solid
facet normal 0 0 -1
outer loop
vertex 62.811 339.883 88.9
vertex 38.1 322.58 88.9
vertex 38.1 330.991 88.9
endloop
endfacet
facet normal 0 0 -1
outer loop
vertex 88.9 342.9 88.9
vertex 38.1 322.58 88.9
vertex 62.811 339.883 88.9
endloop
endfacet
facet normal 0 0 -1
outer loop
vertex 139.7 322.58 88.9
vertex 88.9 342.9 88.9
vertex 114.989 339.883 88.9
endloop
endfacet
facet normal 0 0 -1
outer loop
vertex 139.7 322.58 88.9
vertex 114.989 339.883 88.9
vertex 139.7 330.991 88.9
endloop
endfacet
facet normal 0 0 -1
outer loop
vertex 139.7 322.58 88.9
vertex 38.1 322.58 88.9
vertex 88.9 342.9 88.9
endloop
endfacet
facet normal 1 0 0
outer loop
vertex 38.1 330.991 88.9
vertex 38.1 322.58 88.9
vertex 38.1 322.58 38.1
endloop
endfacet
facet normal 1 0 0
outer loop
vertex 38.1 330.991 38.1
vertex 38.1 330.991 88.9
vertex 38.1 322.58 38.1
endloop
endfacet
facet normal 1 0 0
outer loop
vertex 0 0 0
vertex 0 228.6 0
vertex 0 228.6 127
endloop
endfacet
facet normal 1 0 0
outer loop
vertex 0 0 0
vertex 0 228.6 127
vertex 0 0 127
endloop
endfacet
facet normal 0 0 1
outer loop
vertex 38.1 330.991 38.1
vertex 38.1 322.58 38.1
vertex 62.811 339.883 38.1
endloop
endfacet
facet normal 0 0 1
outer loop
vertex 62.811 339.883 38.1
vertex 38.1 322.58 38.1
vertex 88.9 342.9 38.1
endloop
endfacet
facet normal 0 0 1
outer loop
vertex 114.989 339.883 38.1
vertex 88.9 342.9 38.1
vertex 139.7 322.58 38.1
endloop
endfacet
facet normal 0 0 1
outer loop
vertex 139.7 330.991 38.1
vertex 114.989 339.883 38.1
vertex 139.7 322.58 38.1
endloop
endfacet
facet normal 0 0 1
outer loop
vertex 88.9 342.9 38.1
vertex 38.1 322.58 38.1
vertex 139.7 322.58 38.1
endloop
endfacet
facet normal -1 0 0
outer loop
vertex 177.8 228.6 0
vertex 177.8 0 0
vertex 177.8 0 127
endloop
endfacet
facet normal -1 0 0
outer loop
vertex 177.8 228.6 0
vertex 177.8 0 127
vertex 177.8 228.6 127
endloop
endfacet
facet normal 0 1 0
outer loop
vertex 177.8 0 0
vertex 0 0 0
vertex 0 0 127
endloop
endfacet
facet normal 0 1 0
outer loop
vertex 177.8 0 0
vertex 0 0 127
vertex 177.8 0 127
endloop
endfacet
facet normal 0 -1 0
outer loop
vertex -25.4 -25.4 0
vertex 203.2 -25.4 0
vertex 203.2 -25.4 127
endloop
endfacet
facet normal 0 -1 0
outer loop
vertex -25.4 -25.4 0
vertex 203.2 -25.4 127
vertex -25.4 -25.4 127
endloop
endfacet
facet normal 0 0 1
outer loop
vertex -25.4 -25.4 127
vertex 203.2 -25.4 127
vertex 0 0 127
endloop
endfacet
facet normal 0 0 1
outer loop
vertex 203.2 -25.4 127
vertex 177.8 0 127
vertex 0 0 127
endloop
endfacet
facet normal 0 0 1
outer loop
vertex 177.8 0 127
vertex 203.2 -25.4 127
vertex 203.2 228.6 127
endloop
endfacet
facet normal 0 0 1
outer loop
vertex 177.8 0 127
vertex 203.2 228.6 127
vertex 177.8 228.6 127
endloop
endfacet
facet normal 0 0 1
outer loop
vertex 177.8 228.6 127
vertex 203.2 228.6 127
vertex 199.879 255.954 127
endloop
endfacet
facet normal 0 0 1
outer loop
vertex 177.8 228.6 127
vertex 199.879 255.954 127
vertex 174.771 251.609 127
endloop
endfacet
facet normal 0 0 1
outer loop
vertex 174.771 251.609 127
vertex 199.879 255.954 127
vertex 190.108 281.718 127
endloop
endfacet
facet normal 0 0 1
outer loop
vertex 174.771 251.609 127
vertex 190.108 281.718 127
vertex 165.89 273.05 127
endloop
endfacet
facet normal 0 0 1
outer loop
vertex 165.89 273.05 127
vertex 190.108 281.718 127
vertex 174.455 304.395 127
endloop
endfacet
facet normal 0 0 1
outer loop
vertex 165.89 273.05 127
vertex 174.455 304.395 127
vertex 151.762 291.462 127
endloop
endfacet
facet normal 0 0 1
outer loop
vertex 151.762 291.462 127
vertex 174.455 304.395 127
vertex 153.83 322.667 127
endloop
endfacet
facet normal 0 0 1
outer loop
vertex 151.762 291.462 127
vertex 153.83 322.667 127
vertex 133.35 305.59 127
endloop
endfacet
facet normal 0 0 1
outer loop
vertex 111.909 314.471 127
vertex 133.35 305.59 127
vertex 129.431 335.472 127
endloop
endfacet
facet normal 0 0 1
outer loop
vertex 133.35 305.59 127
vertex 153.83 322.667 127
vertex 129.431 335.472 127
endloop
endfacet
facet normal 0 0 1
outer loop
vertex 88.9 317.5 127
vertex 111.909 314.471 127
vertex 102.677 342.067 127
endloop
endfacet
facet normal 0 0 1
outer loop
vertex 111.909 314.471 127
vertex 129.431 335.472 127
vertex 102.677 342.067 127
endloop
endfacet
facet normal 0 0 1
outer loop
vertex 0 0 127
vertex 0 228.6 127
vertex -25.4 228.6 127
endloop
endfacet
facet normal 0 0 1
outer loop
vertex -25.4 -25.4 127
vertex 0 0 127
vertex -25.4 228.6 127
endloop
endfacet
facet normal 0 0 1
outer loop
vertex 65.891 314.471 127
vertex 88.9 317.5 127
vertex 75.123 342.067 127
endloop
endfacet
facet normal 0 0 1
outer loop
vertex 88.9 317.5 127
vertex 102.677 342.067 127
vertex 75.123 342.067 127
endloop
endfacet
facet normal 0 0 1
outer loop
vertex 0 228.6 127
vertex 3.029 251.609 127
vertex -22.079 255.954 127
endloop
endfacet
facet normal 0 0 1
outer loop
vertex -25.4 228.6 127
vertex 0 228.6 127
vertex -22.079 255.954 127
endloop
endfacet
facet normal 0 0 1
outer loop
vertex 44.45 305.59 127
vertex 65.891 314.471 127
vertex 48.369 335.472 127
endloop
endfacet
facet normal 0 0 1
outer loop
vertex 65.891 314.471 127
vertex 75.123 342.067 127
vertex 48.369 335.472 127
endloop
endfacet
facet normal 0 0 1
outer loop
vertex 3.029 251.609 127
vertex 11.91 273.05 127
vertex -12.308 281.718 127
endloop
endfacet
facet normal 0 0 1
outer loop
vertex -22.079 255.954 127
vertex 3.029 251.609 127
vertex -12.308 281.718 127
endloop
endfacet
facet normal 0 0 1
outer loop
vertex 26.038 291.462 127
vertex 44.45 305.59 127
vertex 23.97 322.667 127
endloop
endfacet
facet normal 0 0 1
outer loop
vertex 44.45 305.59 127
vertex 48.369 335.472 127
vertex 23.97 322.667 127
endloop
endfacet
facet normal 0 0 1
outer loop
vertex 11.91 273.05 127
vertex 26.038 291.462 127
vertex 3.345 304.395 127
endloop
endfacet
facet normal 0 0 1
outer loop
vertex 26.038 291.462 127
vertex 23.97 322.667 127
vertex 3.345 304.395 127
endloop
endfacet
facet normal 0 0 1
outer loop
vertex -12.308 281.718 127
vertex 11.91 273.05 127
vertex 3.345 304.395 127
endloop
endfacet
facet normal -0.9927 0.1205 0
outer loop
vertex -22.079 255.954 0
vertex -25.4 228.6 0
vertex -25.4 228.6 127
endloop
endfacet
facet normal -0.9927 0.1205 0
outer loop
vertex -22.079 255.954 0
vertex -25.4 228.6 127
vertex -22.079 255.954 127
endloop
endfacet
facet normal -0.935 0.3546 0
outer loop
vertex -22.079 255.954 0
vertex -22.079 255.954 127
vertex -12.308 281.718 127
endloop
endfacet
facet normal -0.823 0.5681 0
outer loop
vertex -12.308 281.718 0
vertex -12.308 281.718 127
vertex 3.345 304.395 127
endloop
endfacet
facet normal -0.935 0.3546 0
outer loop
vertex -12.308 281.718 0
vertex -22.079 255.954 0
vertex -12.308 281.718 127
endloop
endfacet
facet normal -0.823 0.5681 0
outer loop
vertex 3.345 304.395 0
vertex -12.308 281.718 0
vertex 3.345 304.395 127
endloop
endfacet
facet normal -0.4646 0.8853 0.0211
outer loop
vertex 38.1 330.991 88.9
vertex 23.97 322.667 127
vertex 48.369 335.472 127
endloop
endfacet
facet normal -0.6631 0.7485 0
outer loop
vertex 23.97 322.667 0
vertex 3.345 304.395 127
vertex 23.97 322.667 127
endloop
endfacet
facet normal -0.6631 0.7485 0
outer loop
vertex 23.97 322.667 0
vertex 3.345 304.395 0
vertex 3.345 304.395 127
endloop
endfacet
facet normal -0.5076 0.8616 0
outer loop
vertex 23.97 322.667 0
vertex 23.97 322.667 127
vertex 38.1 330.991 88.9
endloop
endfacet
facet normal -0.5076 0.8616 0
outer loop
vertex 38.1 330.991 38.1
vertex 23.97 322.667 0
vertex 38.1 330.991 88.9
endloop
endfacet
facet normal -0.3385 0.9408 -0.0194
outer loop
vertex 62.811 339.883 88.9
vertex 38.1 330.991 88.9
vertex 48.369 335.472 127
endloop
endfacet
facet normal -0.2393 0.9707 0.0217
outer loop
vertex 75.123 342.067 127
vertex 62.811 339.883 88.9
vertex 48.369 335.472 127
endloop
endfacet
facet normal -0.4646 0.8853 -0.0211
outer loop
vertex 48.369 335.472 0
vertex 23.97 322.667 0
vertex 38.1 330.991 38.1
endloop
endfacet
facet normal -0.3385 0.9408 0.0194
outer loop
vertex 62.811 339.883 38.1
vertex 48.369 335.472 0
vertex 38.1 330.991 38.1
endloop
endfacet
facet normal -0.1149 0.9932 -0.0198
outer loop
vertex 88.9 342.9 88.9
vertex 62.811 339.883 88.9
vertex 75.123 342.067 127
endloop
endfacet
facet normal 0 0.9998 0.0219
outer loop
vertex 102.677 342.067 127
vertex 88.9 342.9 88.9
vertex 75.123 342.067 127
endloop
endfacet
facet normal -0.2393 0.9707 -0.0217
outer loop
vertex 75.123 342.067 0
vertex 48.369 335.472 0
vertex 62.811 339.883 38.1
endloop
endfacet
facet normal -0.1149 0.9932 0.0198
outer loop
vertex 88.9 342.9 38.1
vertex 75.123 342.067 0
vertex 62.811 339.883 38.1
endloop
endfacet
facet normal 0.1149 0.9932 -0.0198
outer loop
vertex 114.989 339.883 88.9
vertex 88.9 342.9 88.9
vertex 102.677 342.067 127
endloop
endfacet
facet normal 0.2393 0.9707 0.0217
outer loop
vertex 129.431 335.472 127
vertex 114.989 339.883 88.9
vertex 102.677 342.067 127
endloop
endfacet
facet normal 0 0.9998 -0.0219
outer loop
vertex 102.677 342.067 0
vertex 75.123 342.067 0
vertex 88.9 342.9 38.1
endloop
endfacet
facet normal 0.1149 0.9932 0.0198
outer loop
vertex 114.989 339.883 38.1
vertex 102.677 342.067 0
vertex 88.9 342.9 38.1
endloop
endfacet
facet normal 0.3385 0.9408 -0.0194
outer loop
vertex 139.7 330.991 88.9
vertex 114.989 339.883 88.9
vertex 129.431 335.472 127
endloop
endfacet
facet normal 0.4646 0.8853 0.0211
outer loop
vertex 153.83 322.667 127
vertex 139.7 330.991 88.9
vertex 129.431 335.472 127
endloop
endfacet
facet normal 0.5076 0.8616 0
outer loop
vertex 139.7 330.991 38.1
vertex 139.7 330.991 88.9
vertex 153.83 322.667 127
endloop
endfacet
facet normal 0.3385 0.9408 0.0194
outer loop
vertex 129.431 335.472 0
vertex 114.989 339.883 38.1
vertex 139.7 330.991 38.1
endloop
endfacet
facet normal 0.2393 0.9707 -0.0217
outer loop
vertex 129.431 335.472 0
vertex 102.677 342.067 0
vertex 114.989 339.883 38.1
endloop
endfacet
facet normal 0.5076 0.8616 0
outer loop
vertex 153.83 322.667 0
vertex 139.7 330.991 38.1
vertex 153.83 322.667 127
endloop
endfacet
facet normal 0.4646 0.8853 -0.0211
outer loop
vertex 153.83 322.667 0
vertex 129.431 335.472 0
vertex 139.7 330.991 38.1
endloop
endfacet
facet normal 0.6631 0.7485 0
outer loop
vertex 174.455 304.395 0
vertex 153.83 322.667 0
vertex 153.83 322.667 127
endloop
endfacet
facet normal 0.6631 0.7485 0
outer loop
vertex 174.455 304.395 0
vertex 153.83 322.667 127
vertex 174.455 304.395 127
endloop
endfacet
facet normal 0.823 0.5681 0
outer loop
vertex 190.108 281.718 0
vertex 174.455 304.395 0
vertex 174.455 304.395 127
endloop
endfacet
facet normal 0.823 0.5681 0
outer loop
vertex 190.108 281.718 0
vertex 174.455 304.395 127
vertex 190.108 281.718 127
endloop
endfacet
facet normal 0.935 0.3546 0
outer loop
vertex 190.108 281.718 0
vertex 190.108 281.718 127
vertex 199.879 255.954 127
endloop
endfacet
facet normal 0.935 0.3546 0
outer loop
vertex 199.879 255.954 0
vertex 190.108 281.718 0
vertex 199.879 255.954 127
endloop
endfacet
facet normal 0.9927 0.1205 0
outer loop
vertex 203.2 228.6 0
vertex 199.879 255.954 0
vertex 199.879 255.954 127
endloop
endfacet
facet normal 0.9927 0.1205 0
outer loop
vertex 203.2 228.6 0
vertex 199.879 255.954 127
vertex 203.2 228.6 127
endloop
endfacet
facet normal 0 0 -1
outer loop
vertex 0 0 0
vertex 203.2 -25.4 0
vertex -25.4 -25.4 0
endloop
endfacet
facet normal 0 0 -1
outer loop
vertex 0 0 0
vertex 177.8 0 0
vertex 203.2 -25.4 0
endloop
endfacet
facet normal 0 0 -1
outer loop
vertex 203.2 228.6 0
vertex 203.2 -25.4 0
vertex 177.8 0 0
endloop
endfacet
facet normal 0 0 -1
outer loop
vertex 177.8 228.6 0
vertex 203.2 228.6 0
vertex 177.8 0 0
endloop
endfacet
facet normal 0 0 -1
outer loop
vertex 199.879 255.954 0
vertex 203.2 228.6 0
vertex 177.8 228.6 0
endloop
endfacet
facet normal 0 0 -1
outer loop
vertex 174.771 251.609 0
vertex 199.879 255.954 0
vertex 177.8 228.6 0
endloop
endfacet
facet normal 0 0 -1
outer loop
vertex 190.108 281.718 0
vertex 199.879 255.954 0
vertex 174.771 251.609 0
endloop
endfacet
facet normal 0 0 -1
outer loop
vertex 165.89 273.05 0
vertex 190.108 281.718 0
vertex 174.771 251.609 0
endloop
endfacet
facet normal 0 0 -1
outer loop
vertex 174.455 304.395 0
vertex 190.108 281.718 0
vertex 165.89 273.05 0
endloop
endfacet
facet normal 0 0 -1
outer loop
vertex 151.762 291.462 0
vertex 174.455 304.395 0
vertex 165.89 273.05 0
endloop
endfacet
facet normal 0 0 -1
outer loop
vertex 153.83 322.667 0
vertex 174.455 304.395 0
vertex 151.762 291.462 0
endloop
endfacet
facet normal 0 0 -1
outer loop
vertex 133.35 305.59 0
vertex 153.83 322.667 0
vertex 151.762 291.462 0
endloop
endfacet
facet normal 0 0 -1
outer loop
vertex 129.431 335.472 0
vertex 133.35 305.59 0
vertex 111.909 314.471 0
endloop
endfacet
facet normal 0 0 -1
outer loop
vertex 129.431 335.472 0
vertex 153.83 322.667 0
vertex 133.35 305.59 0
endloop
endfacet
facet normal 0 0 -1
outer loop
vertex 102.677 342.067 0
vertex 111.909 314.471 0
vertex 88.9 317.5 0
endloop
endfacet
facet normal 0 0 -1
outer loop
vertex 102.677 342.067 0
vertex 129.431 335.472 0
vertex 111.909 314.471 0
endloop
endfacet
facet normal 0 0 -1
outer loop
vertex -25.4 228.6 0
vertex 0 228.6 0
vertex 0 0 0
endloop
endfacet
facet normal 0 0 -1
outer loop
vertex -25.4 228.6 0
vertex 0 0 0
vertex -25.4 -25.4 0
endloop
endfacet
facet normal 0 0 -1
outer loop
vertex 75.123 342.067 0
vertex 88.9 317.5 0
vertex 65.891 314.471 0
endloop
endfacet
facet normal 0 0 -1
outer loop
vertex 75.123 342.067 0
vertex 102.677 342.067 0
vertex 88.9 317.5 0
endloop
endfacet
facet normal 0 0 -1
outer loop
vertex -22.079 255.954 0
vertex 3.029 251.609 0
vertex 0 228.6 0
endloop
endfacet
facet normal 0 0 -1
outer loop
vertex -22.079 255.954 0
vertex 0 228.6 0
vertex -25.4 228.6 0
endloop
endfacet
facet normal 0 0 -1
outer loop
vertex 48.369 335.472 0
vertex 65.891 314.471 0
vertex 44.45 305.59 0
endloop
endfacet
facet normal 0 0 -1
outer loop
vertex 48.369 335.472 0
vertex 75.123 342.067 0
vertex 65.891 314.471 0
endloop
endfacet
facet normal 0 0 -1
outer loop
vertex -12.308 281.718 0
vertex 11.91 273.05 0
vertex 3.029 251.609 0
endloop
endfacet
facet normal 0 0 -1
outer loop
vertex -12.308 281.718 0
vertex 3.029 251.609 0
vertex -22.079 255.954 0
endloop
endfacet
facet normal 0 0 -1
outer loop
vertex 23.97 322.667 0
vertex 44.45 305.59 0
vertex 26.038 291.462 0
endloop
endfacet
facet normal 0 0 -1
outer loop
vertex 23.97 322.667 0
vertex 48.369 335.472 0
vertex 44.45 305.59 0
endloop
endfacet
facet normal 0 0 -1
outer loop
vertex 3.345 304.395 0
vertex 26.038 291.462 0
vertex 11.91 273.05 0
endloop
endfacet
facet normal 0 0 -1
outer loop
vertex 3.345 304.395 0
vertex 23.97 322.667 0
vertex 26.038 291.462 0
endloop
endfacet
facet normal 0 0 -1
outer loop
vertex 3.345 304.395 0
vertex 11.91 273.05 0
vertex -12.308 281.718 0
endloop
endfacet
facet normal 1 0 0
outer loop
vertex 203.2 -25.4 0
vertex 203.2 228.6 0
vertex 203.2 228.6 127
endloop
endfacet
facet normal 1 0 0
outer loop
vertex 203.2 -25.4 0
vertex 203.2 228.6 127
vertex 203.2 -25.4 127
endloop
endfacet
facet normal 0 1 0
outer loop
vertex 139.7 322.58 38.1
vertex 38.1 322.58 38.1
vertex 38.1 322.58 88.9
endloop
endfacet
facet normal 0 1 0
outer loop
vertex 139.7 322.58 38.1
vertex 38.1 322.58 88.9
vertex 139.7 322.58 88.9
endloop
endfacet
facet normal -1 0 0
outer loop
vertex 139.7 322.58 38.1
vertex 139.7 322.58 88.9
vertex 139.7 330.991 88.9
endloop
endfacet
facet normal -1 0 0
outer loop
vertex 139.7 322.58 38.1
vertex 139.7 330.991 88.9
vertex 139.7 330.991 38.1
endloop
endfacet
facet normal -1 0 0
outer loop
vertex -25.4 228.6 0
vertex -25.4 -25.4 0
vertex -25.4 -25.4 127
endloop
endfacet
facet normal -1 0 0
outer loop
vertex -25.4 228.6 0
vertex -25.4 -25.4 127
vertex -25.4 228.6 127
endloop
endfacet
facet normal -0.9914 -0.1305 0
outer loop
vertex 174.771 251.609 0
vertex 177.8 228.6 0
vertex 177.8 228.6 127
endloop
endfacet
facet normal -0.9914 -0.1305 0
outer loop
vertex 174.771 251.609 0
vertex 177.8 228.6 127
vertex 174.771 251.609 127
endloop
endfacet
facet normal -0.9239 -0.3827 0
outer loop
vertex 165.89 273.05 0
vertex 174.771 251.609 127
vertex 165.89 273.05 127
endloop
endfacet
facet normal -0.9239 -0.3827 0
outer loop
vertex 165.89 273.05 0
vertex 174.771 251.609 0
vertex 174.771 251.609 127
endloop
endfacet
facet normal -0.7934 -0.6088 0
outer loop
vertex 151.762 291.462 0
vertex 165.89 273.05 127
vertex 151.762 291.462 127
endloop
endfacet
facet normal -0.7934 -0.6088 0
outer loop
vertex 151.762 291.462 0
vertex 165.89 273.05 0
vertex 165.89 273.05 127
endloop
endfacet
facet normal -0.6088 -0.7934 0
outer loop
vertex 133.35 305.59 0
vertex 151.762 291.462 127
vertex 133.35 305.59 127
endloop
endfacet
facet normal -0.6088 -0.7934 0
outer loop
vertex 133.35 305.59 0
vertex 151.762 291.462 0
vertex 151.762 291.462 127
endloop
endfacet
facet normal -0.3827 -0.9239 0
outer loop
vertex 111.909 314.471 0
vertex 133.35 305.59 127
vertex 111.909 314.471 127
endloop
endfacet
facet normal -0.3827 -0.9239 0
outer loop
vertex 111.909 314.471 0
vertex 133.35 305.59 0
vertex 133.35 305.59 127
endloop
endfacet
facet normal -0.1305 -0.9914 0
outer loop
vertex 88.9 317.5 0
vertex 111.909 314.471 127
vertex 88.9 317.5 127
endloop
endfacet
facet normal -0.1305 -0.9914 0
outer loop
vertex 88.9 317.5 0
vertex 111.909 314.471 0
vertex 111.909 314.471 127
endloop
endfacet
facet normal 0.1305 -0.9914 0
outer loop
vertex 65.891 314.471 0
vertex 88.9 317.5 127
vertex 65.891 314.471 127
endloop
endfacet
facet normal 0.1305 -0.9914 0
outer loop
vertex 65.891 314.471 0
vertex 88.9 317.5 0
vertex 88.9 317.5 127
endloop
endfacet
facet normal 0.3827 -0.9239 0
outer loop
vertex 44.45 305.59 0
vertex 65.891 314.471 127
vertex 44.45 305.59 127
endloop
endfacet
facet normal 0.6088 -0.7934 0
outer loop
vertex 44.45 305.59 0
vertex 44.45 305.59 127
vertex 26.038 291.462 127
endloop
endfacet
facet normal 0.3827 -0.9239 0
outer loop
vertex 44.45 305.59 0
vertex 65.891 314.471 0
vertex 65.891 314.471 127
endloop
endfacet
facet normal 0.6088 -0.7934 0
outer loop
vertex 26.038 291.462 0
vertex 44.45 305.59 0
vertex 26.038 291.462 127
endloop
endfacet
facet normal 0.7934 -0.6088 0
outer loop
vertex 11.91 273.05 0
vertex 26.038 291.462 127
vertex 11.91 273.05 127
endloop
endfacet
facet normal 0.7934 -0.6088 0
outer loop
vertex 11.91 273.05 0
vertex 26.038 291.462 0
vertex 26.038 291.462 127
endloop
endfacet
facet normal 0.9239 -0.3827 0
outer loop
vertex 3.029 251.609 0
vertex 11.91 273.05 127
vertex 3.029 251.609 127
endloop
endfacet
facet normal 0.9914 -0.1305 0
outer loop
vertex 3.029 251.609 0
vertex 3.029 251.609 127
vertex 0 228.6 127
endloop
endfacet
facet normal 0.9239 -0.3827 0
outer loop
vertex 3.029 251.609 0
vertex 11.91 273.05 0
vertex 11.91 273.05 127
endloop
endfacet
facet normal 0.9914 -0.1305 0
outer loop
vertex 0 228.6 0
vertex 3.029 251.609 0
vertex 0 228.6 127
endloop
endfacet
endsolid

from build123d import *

# Parameters (mm, degrees)
BOSS_EXTRUDE1_DEPTH     = 127
CUT_EXTRUDE1_DEPTH      = 440.390634857
CUT_EXTRUDE1_DEPTH_BACK = 20.32
SKETCH2_W               = 101.6
SKETCH2_H               = 50.8


with BuildPart() as part:
    # Sketch1 → Boss-Extrude1 (new body)
    with BuildSketch(Plane.XY):
        with BuildLine():
            Line((-25.4, -25.4), (-25.4, 228.6))
            ThreePointArc((-25.4, 228.6), (88.9, 342.9), (203.2, 228.6))
            Line((203.2, 228.6), (203.2, -25.4))
            Line((203.2, -25.4), (-25.4, -25.4))
        make_face()
        with BuildLine():
            Line((0, 0), (177.8, 0))
            Line((177.8, 0), (177.8, 228.6))
            ThreePointArc((177.8, 228.6), (88.9, 317.5), (0, 228.6))
            Line((0, 228.6), (0, 0))
        make_face(mode=Mode.SUBTRACT)
    extrude(amount=BOSS_EXTRUDE1_DEPTH)

    # Sketch2 → Cut-Extrude1 (cut, two sides: drawn at the far end of the back side and taken through both)
    with BuildSketch(Plane(origin=(0, 342.9, 0), x_dir=(1, 0, 0), z_dir=(0, 1, 0)).offset(-CUT_EXTRUDE1_DEPTH_BACK)):
        with Locations((88.9, -63.5)):
            Rectangle(SKETCH2_W, SKETCH2_H)
    extrude(amount=CUT_EXTRUDE1_DEPTH + CUT_EXTRUDE1_DEPTH_BACK, mode=Mode.SUBTRACT)


solid = part.part
